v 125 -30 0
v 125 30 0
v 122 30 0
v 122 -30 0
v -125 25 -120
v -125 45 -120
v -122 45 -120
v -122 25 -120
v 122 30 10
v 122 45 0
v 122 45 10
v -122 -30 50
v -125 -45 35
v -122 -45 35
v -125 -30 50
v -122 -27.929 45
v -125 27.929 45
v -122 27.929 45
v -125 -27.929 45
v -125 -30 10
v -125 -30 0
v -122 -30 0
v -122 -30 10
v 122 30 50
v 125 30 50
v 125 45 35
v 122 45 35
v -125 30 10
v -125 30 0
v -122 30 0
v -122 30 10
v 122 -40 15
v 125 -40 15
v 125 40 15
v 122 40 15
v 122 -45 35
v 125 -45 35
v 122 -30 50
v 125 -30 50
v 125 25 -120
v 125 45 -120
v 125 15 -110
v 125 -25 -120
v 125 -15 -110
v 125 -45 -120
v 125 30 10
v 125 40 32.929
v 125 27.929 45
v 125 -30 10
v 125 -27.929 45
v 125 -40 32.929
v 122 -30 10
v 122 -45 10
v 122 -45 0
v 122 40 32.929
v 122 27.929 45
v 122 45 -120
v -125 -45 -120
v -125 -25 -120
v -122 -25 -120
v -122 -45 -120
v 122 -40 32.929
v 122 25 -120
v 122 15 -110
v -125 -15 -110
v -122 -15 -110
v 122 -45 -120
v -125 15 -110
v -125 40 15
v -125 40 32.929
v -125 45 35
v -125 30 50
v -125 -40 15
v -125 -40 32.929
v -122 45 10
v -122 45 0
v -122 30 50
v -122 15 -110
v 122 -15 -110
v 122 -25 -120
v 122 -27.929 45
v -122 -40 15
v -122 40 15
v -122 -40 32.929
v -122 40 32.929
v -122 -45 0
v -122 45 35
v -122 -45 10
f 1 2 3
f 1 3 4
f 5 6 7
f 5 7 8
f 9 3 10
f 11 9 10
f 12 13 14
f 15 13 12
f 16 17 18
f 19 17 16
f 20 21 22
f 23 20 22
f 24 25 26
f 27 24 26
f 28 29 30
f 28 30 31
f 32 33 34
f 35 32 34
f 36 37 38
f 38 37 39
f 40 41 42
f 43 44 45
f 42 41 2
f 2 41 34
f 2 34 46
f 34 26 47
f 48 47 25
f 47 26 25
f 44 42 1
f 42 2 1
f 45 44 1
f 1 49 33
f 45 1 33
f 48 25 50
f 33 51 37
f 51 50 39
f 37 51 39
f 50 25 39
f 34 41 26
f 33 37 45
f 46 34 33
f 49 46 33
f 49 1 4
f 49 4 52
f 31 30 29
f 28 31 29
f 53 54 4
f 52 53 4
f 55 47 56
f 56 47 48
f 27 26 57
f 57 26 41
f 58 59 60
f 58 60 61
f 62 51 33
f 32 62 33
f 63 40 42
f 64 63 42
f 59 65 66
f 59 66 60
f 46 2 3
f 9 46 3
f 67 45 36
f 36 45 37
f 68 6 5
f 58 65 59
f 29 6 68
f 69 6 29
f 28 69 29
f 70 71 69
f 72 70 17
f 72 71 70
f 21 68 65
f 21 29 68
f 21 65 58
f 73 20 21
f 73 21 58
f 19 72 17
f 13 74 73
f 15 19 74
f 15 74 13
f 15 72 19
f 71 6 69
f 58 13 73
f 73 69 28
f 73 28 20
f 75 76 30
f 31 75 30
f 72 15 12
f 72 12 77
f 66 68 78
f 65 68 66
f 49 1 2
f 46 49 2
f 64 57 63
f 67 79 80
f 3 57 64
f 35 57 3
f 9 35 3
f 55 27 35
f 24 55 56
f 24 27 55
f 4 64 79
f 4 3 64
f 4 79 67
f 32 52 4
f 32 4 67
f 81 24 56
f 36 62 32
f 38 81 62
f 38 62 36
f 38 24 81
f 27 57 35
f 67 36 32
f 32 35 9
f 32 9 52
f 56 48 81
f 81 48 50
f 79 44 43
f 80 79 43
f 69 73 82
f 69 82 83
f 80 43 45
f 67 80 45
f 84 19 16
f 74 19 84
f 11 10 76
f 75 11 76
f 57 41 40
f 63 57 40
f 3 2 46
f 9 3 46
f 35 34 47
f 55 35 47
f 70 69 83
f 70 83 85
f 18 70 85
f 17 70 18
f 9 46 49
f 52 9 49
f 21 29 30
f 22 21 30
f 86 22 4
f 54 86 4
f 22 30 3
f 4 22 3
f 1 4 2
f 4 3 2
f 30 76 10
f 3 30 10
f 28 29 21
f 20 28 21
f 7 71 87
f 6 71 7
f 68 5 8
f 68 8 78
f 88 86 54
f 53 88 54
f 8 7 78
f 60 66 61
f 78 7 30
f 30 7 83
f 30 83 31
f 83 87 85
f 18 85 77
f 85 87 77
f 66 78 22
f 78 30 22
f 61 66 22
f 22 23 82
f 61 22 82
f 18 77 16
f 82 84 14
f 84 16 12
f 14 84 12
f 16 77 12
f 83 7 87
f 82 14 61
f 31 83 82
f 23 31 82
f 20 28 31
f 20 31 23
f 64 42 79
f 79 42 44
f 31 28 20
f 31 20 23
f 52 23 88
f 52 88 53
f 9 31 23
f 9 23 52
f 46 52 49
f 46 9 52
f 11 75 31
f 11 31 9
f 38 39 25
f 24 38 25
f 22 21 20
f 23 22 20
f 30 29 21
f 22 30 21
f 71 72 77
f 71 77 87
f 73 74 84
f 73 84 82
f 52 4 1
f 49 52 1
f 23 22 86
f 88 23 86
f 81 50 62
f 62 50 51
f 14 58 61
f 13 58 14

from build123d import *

# Parameters (mm, degrees)
F1_DEPTH = 10
F2_W     = 60
F2_H     = 10
F3_DEPTH = 3


with BuildPart() as f1:
    # F0 (on Top) → F1 (new body)
    with BuildSketch(Plane.XY):
        Polygon((-122, -30), (-122, -45), (122, -45), (122, -30), (125, -30), (125, 30), (122, 30), (122, 45), (-122, 45), (-122, 30), (-125, 30), (-125, -30), align=None)
    extrude(amount=F1_DEPTH)


with BuildPart() as f3:
    # F2 (on face) → F3 (new body)
    with BuildSketch(Plane(origin=(-125, 0, 0), x_dir=(0, -1, 0), z_dir=(-1, 0, 0))):
        Polygon((45, 35), (30, 50), (-30, 50), (-45, 35), (-45, -50), (-45, -120), (-25, -120), (-15, -110), (15, -110), (25, -120), (45, -120), (45, -50), align=None)
        with Locations((0, 5)):
            Rectangle(F2_W, F2_H, mode=Mode.SUBTRACT)
        Polygon((40, 15), (-40, 15), (-40, 32.928932), (-27.928932, 45), (27.928932, 45), (40, 32.928932), align=None, mode=Mode.SUBTRACT)
    extrude(amount=-F3_DEPTH)


with BuildPart() as f4_1:
    # F4: instance of F3
    add(f3.part.mirror(Plane.YZ))


solid = Compound([f1.part, f3.part, f4_1.part])
